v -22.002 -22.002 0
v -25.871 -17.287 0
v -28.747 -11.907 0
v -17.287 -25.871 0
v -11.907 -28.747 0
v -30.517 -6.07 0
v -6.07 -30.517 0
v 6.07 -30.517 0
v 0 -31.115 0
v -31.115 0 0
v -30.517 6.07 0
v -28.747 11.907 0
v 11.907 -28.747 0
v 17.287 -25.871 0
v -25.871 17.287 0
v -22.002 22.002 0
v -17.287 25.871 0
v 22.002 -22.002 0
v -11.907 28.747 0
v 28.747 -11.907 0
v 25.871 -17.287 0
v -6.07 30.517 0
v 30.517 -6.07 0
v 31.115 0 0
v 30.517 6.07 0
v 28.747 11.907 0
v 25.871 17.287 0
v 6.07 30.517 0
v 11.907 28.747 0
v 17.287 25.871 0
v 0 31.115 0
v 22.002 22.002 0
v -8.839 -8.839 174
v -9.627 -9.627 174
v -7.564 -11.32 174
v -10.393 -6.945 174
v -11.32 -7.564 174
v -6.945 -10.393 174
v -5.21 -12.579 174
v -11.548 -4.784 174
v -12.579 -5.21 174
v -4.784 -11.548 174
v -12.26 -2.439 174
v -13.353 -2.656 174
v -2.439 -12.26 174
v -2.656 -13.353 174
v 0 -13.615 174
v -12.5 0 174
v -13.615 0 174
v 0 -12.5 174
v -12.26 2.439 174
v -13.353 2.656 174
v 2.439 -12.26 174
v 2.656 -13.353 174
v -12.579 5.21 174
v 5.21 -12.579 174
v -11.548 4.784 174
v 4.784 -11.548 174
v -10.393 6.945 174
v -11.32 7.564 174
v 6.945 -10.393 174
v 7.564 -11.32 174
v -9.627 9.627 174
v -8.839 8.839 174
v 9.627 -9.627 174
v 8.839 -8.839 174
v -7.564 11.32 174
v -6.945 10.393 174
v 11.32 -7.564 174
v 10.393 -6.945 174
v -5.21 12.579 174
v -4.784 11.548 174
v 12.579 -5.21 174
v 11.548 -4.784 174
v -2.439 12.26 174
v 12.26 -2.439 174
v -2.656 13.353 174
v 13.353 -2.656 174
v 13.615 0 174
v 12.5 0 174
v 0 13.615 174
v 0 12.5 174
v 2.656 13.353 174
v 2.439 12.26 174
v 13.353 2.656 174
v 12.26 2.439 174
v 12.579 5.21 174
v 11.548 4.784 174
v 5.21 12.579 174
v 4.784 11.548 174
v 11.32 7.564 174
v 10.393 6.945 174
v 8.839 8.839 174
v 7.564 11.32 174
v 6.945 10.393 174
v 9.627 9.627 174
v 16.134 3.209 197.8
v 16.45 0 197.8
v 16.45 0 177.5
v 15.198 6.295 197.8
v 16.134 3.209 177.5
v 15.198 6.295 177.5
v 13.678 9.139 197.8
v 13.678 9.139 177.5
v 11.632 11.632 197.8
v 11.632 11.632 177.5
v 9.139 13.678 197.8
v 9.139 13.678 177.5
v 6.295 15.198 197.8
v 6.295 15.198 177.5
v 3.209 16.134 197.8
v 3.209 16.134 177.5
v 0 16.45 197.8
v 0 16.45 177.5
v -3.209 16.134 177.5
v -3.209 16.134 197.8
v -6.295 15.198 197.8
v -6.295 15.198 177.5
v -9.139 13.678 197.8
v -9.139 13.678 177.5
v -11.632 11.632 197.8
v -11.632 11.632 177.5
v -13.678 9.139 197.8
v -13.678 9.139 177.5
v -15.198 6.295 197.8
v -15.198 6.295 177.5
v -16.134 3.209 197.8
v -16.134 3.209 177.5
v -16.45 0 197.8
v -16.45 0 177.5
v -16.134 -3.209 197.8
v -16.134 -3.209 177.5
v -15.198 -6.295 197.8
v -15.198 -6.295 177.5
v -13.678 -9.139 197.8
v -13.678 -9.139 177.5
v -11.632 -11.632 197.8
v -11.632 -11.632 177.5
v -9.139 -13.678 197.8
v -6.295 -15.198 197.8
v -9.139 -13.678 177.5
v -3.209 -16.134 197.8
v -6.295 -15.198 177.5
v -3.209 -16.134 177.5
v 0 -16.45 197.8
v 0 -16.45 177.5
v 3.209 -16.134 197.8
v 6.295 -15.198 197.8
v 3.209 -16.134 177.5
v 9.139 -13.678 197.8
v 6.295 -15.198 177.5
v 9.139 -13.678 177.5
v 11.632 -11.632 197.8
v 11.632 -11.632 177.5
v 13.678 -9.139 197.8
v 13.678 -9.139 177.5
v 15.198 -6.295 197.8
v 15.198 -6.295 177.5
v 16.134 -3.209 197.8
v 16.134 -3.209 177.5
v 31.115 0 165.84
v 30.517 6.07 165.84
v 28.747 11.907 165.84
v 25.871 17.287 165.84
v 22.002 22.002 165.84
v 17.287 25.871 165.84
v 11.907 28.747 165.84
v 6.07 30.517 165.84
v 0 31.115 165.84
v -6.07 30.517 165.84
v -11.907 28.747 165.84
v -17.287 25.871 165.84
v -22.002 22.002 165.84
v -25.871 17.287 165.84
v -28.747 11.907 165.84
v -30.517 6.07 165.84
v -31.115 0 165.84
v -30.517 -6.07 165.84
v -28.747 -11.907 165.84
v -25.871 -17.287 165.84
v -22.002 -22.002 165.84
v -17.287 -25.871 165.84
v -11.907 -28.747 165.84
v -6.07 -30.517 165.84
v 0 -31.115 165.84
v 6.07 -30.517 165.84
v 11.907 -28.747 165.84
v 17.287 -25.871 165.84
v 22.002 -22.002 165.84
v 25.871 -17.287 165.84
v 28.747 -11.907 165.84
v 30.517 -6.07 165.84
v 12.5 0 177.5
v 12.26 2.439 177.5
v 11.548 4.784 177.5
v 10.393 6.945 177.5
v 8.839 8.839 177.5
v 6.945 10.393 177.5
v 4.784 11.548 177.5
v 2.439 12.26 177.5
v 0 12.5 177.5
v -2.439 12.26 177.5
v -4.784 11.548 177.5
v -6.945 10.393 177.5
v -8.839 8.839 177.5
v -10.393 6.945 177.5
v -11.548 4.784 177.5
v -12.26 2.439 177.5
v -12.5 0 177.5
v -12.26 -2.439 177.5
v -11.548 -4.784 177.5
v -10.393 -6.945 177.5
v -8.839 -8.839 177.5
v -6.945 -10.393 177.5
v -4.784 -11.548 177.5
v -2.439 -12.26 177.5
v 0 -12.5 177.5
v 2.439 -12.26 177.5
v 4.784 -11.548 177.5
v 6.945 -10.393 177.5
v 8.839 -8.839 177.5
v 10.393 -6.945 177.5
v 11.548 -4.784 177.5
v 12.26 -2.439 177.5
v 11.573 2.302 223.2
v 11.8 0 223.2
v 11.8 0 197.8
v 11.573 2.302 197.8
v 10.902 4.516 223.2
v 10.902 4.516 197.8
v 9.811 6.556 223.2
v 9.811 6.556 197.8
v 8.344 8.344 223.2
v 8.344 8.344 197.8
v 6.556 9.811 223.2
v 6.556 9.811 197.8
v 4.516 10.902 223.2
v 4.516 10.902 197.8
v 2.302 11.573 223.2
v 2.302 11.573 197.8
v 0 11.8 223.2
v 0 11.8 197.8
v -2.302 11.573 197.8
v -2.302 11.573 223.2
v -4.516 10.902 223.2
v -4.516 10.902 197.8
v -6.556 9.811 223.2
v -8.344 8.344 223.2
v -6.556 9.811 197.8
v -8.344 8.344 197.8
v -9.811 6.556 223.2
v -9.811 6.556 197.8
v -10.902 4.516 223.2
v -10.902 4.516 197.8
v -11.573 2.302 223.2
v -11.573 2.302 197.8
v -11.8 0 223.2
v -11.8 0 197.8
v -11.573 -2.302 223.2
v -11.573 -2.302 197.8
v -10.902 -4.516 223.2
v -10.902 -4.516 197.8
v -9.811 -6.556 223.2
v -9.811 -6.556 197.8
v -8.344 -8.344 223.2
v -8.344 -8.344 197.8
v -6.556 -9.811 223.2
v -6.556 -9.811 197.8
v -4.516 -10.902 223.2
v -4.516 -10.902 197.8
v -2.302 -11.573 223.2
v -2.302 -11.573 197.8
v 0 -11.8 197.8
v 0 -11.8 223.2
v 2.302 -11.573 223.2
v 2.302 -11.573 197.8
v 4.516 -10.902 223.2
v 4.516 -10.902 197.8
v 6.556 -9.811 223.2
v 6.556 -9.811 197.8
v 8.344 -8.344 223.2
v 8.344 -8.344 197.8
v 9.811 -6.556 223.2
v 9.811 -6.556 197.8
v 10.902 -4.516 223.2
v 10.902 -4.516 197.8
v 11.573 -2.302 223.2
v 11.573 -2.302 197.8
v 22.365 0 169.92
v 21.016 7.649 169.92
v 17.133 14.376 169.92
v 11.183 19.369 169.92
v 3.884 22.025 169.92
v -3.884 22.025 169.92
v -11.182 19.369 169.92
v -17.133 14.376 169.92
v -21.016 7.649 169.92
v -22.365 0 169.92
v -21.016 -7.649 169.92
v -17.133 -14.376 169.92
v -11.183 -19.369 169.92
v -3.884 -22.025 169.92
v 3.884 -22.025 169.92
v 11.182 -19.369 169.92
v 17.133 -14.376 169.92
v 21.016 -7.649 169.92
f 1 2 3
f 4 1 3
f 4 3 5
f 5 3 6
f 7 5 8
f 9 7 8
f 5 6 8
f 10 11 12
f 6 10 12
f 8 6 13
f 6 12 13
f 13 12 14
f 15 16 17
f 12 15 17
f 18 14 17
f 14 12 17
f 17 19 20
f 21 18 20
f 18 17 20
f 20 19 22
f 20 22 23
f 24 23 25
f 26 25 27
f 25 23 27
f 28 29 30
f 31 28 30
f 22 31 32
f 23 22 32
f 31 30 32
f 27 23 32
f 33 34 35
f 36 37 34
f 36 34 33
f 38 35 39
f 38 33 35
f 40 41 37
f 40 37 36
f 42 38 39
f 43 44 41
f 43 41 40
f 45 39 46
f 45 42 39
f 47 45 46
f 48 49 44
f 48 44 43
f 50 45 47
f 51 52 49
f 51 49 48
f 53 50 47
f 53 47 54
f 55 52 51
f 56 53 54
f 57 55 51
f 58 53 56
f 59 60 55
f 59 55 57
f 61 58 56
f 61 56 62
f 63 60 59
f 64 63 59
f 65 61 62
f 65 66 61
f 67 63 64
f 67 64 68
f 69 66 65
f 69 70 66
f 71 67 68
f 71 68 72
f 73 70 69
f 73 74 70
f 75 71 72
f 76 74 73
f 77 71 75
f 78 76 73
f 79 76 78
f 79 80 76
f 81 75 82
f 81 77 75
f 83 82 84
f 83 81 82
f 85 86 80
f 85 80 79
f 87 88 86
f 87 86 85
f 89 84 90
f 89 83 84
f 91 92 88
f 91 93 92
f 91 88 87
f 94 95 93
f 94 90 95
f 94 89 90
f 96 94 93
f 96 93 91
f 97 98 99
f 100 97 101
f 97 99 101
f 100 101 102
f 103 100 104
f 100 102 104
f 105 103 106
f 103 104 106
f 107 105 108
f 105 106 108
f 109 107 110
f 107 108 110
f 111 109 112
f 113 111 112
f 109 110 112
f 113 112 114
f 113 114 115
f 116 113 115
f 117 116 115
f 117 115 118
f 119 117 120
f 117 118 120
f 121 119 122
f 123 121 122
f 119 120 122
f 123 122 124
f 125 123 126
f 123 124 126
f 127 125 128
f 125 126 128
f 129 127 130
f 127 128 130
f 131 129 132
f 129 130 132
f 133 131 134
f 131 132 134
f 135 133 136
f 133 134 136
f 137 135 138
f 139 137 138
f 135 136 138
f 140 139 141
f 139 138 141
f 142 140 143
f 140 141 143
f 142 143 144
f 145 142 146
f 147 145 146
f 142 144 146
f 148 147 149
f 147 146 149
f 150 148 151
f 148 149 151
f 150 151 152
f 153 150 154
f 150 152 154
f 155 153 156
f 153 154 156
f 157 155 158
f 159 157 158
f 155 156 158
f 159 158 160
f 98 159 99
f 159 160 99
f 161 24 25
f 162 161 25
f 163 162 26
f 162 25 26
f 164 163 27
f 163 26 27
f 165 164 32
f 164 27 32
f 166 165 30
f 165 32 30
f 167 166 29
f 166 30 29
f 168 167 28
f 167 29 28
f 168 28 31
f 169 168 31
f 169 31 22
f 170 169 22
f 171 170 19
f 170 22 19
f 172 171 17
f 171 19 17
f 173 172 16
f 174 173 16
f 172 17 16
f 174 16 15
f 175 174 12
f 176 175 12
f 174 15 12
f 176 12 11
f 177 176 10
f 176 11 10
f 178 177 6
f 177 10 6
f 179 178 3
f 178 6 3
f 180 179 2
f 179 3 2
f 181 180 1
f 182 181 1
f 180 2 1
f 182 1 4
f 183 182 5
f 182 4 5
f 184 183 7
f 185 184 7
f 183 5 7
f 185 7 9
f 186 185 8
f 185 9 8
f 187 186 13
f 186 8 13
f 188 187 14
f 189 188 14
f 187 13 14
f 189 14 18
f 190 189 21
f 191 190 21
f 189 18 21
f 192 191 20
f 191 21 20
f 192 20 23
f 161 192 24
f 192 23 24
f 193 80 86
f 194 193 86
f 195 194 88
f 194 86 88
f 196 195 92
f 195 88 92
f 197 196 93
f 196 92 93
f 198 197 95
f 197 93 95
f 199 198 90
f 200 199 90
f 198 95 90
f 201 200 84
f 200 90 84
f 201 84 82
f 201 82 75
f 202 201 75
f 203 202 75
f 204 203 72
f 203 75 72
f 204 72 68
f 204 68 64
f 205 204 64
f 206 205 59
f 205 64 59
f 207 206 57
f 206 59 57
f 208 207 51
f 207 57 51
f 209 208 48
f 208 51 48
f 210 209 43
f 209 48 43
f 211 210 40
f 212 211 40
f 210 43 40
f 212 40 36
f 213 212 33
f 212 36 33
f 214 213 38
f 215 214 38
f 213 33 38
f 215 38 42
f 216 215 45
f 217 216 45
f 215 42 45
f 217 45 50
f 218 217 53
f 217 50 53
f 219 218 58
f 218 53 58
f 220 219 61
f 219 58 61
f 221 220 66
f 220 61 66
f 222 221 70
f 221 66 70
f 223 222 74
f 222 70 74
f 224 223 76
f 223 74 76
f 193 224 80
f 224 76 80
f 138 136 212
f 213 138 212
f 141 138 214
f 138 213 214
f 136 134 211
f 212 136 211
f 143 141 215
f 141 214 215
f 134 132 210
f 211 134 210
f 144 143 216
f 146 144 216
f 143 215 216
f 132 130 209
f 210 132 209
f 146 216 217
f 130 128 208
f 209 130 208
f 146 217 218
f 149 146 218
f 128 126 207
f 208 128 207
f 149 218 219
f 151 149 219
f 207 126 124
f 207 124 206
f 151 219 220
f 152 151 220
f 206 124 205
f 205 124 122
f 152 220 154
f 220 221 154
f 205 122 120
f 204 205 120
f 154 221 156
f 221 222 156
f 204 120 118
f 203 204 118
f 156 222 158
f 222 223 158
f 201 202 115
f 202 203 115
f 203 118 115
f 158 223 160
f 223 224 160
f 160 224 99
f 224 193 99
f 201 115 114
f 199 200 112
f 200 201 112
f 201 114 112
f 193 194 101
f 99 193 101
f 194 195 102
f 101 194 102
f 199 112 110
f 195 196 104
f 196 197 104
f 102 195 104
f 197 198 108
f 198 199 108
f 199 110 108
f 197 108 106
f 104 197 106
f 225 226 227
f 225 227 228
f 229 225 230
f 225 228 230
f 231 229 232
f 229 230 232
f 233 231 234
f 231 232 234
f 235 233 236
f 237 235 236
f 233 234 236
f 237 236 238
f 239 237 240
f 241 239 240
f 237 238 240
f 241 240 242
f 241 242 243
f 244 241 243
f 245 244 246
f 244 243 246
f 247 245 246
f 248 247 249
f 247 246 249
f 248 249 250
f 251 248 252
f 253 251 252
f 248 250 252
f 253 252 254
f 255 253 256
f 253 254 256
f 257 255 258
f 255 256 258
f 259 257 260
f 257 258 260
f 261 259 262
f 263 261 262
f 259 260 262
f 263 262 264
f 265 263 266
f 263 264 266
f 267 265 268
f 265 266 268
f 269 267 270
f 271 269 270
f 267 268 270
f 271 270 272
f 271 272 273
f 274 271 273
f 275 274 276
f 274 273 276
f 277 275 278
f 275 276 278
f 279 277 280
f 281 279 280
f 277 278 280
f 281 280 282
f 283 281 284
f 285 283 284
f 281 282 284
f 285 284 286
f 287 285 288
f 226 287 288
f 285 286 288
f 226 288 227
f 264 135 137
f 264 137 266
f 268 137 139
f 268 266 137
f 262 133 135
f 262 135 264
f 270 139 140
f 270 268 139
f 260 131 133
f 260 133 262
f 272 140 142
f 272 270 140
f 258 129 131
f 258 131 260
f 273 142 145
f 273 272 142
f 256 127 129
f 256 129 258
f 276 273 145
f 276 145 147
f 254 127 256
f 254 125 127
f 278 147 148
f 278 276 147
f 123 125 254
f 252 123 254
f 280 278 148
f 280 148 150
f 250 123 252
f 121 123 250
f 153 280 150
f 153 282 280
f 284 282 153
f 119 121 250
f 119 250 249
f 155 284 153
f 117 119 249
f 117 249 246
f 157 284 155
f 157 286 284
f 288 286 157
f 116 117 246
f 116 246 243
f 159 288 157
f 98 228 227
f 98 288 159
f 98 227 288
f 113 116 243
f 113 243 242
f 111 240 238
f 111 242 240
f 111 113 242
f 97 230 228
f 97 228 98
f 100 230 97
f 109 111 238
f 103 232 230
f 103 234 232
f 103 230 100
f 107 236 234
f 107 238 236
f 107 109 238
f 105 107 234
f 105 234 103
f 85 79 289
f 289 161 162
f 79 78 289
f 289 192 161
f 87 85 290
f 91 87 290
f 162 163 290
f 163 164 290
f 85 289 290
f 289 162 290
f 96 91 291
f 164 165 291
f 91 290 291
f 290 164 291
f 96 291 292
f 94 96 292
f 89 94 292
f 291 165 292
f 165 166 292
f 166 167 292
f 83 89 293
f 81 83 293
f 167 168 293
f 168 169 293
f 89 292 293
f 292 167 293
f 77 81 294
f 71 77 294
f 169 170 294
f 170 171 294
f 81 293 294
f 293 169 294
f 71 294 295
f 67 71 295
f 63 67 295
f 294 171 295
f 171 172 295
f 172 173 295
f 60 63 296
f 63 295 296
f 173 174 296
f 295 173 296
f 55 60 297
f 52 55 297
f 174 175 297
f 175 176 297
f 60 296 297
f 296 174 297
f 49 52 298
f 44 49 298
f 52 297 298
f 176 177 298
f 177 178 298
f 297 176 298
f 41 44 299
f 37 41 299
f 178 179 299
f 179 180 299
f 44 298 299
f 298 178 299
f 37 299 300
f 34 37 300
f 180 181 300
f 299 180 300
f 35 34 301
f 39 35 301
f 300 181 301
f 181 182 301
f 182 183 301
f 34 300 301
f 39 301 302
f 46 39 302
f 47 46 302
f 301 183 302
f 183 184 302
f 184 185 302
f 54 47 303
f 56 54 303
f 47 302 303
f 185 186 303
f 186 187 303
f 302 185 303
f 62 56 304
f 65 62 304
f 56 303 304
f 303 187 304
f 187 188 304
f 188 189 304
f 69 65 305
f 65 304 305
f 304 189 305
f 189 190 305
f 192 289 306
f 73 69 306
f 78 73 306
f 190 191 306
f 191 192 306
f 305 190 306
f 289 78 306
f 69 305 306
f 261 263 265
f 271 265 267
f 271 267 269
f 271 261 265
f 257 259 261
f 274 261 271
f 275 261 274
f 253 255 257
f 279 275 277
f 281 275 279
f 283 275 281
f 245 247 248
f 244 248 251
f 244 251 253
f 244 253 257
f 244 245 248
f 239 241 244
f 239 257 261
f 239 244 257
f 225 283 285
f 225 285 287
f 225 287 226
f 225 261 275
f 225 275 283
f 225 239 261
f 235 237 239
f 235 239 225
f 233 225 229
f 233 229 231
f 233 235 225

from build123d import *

# Parameters (mm, degrees)
F0_R     = 31.115
F1_DEPTH = 174
F2_SIZE2 = 8.1603840177
F2_SIZE  = 17.5
F3_R     = 12.5
F4_DEPTH = 3.5
F5_R     = 16.45
F6_DEPTH = 20.3
F7_R     = 11.8
F8_DEPTH = 25.4


with BuildPart() as f1:
    # F0 (on Top) → F1 (new body)
    with BuildSketch(Plane.XY):
        Circle(F0_R)
    extrude(amount=F1_DEPTH)

    # F2
    f2_edges = [f1.edges().sort_by_distance(p)[0] for p in [
        (-31.115, 0, 174),
    ]]
    f2_side = f1.faces().sort_by_distance((0, 0, 174))[0]
    chamfer(f2_edges, length=F2_SIZE, length2=F2_SIZE2, reference=f2_side)

    # F3 (on face) → F4 (join)
    with BuildSketch(Plane.XY.offset(174)):
        Circle(F3_R)
    extrude(amount=F4_DEPTH)

    # F5 (on face) → F6 (join)
    with BuildSketch(Plane.XY.offset(177.5)):
        Circle(F5_R)
    extrude(amount=F6_DEPTH)

    # F7 (on face) → F8 (join)
    with BuildSketch(Plane.XY.offset(197.8)):
        Circle(F7_R)
    extrude(amount=F8_DEPTH)


solid = f1.part
